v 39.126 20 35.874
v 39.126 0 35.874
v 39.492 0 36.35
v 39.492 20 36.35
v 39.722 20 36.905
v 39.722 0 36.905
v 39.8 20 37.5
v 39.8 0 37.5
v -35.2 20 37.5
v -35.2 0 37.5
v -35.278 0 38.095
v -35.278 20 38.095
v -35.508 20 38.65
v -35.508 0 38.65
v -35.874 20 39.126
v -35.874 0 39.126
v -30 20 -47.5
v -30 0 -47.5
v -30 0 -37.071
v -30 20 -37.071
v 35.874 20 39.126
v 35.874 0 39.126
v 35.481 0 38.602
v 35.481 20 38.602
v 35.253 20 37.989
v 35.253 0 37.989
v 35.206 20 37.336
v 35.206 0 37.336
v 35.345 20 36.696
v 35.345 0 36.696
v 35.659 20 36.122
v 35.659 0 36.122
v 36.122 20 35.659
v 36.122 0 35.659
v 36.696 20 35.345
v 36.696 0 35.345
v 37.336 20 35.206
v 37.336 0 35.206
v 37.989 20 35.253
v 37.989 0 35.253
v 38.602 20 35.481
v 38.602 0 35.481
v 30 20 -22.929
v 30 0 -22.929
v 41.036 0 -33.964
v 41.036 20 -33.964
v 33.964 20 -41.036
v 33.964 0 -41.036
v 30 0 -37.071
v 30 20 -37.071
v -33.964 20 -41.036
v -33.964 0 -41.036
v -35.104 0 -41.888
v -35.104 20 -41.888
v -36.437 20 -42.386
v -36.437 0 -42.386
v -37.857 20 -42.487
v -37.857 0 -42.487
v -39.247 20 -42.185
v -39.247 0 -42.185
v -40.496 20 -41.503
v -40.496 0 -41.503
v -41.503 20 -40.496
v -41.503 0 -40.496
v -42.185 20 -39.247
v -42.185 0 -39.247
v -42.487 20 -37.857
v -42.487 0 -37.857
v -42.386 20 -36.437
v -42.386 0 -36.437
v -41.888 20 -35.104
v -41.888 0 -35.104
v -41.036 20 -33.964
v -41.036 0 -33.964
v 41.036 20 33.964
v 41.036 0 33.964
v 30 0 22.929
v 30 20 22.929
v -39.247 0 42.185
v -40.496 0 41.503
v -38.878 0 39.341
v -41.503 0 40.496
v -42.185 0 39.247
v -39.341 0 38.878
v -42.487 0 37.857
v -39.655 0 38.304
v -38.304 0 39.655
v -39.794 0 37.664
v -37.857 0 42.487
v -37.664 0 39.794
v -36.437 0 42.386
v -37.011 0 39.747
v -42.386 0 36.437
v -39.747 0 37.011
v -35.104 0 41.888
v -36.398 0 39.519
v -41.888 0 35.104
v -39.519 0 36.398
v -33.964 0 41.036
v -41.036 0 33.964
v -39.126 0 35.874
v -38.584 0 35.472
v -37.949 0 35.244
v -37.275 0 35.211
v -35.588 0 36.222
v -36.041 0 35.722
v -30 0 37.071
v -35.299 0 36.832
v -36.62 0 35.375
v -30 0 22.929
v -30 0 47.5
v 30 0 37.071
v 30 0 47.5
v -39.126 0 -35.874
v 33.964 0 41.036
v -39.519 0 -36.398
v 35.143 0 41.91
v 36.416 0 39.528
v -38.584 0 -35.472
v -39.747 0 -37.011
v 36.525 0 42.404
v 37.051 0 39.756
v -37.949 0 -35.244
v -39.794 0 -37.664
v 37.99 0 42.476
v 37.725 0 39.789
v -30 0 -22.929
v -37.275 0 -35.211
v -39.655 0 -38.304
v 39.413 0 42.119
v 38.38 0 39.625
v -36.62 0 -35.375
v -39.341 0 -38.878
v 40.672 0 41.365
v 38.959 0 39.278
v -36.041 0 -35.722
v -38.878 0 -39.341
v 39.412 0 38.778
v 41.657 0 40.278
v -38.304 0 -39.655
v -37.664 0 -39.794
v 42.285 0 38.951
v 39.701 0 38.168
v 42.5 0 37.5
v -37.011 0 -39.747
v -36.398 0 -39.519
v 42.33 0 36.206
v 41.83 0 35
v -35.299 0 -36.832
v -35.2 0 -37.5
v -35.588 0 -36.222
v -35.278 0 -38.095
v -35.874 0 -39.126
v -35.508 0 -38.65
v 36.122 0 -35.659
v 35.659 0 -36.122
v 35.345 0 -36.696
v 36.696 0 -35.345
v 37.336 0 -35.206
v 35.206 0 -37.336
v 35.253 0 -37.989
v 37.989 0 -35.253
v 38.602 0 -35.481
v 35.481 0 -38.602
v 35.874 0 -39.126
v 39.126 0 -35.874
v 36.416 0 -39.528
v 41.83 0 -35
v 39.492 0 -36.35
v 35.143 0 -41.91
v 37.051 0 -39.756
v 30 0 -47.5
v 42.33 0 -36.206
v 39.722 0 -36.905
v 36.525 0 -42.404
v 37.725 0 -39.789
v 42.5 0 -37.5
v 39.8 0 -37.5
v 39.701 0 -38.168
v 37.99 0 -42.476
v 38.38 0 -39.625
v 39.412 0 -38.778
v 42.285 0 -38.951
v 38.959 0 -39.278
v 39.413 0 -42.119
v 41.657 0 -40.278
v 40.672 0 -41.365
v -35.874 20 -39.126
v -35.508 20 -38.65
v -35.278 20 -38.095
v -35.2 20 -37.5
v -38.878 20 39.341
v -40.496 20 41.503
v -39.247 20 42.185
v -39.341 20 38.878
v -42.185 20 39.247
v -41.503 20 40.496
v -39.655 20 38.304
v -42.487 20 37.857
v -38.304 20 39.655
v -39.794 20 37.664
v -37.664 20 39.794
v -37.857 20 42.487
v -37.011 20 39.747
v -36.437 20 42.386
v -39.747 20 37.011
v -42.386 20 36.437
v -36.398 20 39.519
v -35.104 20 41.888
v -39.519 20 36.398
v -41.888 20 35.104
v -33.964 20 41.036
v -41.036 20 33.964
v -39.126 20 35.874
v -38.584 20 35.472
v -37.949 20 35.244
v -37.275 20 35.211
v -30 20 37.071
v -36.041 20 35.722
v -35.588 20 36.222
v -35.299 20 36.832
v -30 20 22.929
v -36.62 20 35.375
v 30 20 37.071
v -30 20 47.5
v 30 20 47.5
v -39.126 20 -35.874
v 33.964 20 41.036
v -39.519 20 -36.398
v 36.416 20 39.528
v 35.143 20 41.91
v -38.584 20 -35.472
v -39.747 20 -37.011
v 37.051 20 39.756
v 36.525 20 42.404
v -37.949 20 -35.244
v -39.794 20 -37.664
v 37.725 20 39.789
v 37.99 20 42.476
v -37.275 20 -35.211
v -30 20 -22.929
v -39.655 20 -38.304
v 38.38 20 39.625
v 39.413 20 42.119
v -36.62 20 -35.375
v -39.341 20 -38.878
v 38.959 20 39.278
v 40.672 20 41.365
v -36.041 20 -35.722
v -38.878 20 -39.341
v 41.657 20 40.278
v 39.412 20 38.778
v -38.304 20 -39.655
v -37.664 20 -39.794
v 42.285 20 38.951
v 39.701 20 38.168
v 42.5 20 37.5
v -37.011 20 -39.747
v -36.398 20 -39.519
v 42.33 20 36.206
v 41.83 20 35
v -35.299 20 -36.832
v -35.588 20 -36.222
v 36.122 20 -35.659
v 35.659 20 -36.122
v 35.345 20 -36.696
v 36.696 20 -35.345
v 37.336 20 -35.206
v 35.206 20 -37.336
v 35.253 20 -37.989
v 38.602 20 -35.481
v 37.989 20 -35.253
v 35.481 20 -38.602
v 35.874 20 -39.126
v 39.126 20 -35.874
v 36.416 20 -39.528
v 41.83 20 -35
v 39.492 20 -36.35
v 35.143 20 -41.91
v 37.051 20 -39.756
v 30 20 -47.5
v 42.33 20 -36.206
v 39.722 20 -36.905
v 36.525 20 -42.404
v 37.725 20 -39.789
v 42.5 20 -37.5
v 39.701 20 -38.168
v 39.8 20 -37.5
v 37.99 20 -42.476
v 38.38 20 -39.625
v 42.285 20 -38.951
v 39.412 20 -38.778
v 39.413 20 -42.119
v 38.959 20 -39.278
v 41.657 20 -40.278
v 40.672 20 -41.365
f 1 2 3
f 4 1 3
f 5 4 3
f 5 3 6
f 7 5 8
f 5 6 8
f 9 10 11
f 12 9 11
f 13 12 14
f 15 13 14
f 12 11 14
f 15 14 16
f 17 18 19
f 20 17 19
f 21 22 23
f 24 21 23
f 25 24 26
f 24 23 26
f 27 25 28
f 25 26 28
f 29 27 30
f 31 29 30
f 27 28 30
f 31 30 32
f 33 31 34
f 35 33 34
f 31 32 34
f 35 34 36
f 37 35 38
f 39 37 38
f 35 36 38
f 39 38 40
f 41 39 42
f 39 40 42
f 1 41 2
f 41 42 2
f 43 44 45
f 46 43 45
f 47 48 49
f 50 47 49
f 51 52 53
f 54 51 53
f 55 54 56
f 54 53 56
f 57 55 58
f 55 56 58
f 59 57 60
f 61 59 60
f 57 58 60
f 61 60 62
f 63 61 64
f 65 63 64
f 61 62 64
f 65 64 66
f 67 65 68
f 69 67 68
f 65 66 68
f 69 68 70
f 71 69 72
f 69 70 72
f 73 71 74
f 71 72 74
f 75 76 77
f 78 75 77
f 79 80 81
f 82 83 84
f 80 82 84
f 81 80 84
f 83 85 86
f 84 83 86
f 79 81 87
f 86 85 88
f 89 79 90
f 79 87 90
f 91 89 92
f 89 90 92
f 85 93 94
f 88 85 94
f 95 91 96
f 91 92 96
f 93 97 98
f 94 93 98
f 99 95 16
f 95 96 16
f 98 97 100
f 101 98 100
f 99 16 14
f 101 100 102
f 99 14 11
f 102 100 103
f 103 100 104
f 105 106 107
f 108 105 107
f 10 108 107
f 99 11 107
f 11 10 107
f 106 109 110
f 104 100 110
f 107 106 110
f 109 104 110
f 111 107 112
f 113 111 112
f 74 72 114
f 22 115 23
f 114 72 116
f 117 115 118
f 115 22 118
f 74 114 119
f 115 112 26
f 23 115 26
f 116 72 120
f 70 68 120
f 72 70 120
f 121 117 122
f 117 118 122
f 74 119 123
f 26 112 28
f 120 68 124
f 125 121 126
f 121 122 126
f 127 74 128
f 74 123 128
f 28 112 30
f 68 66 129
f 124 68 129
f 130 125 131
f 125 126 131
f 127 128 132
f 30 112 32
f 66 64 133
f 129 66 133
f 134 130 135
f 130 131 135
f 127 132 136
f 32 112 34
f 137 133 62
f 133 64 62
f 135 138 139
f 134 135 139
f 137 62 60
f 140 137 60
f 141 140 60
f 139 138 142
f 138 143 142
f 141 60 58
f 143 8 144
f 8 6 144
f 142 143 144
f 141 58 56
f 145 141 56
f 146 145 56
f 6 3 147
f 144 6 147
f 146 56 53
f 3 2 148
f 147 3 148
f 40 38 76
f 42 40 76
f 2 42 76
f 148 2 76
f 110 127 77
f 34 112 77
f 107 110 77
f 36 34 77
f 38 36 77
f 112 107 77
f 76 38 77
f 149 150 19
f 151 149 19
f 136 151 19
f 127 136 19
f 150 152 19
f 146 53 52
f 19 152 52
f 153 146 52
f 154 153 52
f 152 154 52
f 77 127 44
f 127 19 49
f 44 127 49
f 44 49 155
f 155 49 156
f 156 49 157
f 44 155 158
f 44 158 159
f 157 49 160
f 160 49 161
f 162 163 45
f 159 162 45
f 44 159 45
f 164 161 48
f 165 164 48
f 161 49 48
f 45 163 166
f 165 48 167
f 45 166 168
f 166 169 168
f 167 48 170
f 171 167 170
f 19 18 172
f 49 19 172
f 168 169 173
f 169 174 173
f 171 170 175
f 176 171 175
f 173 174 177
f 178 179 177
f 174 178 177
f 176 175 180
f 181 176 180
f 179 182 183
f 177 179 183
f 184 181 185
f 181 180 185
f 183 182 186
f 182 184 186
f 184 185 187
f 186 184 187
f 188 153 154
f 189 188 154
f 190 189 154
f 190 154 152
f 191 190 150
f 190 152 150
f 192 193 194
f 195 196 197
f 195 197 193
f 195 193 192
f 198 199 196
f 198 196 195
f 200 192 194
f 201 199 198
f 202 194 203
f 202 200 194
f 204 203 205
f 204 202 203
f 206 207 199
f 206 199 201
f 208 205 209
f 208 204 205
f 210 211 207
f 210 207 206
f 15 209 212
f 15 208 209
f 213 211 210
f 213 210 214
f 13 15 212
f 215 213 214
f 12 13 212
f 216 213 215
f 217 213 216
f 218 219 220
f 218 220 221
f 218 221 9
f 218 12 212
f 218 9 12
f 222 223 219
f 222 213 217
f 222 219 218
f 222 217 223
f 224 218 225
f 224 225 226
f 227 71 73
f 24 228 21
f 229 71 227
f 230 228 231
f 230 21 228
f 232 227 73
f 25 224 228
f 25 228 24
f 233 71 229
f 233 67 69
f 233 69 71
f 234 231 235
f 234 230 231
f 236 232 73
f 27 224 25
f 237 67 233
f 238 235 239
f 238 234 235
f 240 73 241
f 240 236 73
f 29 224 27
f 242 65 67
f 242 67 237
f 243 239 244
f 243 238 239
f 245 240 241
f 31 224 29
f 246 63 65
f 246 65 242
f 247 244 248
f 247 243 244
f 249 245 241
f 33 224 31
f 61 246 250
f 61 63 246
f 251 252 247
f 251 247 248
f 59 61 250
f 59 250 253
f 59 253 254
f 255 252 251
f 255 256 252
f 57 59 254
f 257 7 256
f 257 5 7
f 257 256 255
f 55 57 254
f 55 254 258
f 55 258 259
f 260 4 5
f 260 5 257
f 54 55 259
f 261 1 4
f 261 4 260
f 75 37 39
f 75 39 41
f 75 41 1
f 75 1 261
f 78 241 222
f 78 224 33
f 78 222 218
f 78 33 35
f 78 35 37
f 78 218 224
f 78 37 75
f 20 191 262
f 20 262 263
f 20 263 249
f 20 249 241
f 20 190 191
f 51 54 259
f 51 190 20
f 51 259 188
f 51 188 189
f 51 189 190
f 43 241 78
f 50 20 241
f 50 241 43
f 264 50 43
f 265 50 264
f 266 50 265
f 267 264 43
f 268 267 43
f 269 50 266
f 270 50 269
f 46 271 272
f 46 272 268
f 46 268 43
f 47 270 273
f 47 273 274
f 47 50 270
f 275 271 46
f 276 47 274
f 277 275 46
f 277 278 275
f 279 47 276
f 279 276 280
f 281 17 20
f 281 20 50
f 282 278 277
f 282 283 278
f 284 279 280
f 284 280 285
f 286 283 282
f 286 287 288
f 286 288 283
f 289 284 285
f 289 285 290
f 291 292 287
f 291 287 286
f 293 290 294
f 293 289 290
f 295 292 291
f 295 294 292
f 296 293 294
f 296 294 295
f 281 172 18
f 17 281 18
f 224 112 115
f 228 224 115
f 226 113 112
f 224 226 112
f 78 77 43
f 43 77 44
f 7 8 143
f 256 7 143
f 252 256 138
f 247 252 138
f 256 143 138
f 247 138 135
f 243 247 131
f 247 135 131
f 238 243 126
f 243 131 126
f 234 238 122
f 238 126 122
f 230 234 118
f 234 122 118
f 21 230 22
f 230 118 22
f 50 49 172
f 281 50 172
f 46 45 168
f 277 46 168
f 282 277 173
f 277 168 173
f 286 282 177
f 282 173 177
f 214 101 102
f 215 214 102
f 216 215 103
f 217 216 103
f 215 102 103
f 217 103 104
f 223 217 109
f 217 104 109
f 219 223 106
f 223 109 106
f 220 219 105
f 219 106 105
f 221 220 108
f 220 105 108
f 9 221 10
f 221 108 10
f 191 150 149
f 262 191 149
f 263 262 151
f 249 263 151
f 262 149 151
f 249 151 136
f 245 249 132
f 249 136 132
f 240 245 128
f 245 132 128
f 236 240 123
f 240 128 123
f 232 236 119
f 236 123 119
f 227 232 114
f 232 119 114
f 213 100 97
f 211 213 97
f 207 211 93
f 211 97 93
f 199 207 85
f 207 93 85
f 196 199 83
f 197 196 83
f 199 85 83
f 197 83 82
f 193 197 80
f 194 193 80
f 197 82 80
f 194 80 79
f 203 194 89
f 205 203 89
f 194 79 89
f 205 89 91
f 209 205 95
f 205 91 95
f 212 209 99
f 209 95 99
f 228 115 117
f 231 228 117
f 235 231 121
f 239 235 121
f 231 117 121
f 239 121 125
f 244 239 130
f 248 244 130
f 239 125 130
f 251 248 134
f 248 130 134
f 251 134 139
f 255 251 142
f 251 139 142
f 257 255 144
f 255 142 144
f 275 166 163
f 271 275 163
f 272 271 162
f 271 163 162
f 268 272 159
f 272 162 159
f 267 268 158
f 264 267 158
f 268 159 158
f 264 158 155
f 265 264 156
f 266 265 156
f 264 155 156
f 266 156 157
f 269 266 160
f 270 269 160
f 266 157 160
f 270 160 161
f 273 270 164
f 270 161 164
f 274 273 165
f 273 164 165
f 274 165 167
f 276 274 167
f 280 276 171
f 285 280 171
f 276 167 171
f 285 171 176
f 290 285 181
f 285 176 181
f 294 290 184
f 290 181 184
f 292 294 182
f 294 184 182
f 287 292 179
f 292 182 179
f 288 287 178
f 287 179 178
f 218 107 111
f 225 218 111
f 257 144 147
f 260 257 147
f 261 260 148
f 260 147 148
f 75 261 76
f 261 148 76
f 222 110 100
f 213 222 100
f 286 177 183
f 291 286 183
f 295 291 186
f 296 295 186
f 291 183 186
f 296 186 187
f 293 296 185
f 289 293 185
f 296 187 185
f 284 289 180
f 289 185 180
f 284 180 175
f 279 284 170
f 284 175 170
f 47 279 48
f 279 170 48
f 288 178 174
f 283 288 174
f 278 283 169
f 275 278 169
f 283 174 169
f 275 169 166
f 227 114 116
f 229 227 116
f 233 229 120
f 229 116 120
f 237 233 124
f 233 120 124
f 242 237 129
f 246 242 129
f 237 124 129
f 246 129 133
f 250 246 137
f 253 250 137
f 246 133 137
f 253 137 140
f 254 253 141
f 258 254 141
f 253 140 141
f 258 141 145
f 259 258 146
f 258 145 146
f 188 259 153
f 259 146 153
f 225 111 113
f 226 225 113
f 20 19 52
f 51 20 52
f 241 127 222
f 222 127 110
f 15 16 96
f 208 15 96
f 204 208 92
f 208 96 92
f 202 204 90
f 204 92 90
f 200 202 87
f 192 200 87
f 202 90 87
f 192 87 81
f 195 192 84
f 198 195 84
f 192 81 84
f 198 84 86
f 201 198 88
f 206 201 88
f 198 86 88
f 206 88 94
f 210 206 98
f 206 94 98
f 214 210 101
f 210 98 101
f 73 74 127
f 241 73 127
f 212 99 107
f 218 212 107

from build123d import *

# Parameters (mm, degrees)
BOSS_EXTRU_1_DEPTH = 20


with BuildPart() as part:
    # Esquisse1 → Boss.-Extru.1 (new body)
    with BuildSketch(Plane(origin=(0, 0, 0), x_dir=(1, 0, 0), z_dir=(0, 1, 0))):
        Polygon((30, -47.5), (30, 47.5), (0, 47.5), (-30, 47.5), (-30, -47.5), align=None)
        with BuildLine():
            Line((-30, -37.071067812), (-30, -22.928932188))
            Line((-30, -22.928932188), (-41.035533906, -33.964466094))
            ThreePointArc((-41.035533906, -33.964466094), (-35.586582838, -32.880602337), (-32.5, -37.5))
            ThreePointArc((-32.5, -37.5), (-32.880602337, -39.413417162), (-33.964466094, -41.035533906))
            Line((-33.964466094, -41.035533906), (-30, -37.071067812))
        make_face()
        with BuildLine():
            ThreePointArc((-32.5, -37.5), (-35.586582838, -32.880602337), (-41.035533906, -33.964466094))
            Line((-41.035533906, -33.964466094), (-39.126345597, -35.873654403))
            ThreePointArc((-39.126345597, -35.873654403), (-36.619828106, -35.375077075), (-35.2, -37.5))
            ThreePointArc((-35.2, -37.5), (-35.375077075, -38.380171894), (-35.873654403, -39.126345597))
            Line((-35.873654403, -39.126345597), (-33.964466094, -41.035533906))
            ThreePointArc((-33.964466094, -41.035533906), (-32.880602337, -39.413417162), (-32.5, -37.5))
        make_face()
        with BuildLine():
            Line((-39.126345597, -35.873654403), (-41.035533906, -33.964466094))
            ThreePointArc((-41.035533906, -33.964466094), (-41.035533906, -41.035533906), (-33.964466094, -41.035533906))
            Line((-33.964466094, -41.035533906), (-35.873654403, -39.126345597))
            ThreePointArc((-35.873654403, -39.126345597), (-39.126345597, -39.126345597), (-39.126345597, -35.873654403))
        make_face()
        with BuildLine():
            ThreePointArc((42.5, -37.5), (42.119397663, -35.586582838), (41.035533906, -33.964466094))
            Line((41.035533906, -33.964466094), (39.126345597, -35.873654403))
            ThreePointArc((39.126345597, -35.873654403), (39.624922925, -36.619828106), (39.8, -37.5))
            ThreePointArc((39.8, -37.5), (38.380171894, -39.624922925), (35.873654403, -39.126345597))
            Line((35.873654403, -39.126345597), (33.964466094, -41.035533906))
            ThreePointArc((33.964466094, -41.035533906), (39.413417162, -42.119397663), (42.5, -37.5))
        make_face()
        with BuildLine():
            Line((39.126345597, -35.873654403), (41.035533906, -33.964466094))
            ThreePointArc((41.035533906, -33.964466094), (33.964466094, -33.964466094), (33.964466094, -41.035533906))
            Line((33.964466094, -41.035533906), (35.873654403, -39.126345597))
            ThreePointArc((35.873654403, -39.126345597), (35.873654403, -35.873654403), (39.126345597, -35.873654403))
        make_face()
        with BuildLine():
            Line((41.035533906, -33.964466094), (30, -22.928932188))
            Line((30, -22.928932188), (30, -37.071067812))
            Line((30, -37.071067812), (33.964466094, -41.035533906))
            ThreePointArc((33.964466094, -41.035533906), (33.964466094, -33.964466094), (41.035533906, -33.964466094))
        make_face()
        with BuildLine():
            Line((33.964466094, 41.035533906), (30, 37.071067812))
            Line((30, 37.071067812), (30, 22.928932188))
            Line((30, 22.928932188), (41.035533906, 33.964466094))
            ThreePointArc((41.035533906, 33.964466094), (33.964466094, 33.964466094), (33.964466094, 41.035533906))
        make_face()
        with BuildLine():
            ThreePointArc((42.5, 37.5), (39.413417162, 42.119397663), (33.964466094, 41.035533906))
            Line((33.964466094, 41.035533906), (35.873654403, 39.126345597))
            ThreePointArc((35.873654403, 39.126345597), (38.380171894, 39.624922925), (39.8, 37.5))
            ThreePointArc((39.8, 37.5), (39.624922925, 36.619828106), (39.126345597, 35.873654403))
            Line((39.126345597, 35.873654403), (41.035533906, 33.964466094))
            ThreePointArc((41.035533906, 33.964466094), (42.119397663, 35.586582838), (42.5, 37.5))
        make_face()
        with BuildLine():
            Line((35.873654403, 39.126345597), (33.964466094, 41.035533906))
            ThreePointArc((33.964466094, 41.035533906), (33.964466094, 33.964466094), (41.035533906, 33.964466094))
            Line((41.035533906, 33.964466094), (39.126345597, 35.873654403))
            ThreePointArc((39.126345597, 35.873654403), (35.873654403, 35.873654403), (35.873654403, 39.126345597))
        make_face()
        with BuildLine():
            Line((-30, 22.928932188), (-30, 37.071067812))
            Line((-30, 37.071067812), (-33.964466094, 41.035533906))
            ThreePointArc((-33.964466094, 41.035533906), (-32.880602337, 39.413417162), (-32.5, 37.5))
            ThreePointArc((-32.5, 37.5), (-35.586582838, 32.880602337), (-41.035533906, 33.964466094))
            Line((-41.035533906, 33.964466094), (-30, 22.928932188))
        make_face()
        with BuildLine():
            ThreePointArc((-32.5, 37.5), (-32.880602337, 39.413417162), (-33.964466094, 41.035533906))
            Line((-33.964466094, 41.035533906), (-35.873654403, 39.126345597))
            ThreePointArc((-35.873654403, 39.126345597), (-35.375077075, 38.380171894), (-35.2, 37.5))
            ThreePointArc((-35.2, 37.5), (-36.619828106, 35.375077075), (-39.126345597, 35.873654403))
            Line((-39.126345597, 35.873654403), (-41.035533906, 33.964466094))
            ThreePointArc((-41.035533906, 33.964466094), (-35.586582838, 32.880602337), (-32.5, 37.5))
        make_face()
        with BuildLine():
            Line((-35.873654403, 39.126345597), (-33.964466094, 41.035533906))
            ThreePointArc((-33.964466094, 41.035533906), (-41.035533906, 41.035533906), (-41.035533906, 33.964466094))
            Line((-41.035533906, 33.964466094), (-39.126345597, 35.873654403))
            ThreePointArc((-39.126345597, 35.873654403), (-39.126345597, 39.126345597), (-35.873654403, 39.126345597))
        make_face()
    extrude(amount=BOSS_EXTRU_1_DEPTH)


solid = part.part
